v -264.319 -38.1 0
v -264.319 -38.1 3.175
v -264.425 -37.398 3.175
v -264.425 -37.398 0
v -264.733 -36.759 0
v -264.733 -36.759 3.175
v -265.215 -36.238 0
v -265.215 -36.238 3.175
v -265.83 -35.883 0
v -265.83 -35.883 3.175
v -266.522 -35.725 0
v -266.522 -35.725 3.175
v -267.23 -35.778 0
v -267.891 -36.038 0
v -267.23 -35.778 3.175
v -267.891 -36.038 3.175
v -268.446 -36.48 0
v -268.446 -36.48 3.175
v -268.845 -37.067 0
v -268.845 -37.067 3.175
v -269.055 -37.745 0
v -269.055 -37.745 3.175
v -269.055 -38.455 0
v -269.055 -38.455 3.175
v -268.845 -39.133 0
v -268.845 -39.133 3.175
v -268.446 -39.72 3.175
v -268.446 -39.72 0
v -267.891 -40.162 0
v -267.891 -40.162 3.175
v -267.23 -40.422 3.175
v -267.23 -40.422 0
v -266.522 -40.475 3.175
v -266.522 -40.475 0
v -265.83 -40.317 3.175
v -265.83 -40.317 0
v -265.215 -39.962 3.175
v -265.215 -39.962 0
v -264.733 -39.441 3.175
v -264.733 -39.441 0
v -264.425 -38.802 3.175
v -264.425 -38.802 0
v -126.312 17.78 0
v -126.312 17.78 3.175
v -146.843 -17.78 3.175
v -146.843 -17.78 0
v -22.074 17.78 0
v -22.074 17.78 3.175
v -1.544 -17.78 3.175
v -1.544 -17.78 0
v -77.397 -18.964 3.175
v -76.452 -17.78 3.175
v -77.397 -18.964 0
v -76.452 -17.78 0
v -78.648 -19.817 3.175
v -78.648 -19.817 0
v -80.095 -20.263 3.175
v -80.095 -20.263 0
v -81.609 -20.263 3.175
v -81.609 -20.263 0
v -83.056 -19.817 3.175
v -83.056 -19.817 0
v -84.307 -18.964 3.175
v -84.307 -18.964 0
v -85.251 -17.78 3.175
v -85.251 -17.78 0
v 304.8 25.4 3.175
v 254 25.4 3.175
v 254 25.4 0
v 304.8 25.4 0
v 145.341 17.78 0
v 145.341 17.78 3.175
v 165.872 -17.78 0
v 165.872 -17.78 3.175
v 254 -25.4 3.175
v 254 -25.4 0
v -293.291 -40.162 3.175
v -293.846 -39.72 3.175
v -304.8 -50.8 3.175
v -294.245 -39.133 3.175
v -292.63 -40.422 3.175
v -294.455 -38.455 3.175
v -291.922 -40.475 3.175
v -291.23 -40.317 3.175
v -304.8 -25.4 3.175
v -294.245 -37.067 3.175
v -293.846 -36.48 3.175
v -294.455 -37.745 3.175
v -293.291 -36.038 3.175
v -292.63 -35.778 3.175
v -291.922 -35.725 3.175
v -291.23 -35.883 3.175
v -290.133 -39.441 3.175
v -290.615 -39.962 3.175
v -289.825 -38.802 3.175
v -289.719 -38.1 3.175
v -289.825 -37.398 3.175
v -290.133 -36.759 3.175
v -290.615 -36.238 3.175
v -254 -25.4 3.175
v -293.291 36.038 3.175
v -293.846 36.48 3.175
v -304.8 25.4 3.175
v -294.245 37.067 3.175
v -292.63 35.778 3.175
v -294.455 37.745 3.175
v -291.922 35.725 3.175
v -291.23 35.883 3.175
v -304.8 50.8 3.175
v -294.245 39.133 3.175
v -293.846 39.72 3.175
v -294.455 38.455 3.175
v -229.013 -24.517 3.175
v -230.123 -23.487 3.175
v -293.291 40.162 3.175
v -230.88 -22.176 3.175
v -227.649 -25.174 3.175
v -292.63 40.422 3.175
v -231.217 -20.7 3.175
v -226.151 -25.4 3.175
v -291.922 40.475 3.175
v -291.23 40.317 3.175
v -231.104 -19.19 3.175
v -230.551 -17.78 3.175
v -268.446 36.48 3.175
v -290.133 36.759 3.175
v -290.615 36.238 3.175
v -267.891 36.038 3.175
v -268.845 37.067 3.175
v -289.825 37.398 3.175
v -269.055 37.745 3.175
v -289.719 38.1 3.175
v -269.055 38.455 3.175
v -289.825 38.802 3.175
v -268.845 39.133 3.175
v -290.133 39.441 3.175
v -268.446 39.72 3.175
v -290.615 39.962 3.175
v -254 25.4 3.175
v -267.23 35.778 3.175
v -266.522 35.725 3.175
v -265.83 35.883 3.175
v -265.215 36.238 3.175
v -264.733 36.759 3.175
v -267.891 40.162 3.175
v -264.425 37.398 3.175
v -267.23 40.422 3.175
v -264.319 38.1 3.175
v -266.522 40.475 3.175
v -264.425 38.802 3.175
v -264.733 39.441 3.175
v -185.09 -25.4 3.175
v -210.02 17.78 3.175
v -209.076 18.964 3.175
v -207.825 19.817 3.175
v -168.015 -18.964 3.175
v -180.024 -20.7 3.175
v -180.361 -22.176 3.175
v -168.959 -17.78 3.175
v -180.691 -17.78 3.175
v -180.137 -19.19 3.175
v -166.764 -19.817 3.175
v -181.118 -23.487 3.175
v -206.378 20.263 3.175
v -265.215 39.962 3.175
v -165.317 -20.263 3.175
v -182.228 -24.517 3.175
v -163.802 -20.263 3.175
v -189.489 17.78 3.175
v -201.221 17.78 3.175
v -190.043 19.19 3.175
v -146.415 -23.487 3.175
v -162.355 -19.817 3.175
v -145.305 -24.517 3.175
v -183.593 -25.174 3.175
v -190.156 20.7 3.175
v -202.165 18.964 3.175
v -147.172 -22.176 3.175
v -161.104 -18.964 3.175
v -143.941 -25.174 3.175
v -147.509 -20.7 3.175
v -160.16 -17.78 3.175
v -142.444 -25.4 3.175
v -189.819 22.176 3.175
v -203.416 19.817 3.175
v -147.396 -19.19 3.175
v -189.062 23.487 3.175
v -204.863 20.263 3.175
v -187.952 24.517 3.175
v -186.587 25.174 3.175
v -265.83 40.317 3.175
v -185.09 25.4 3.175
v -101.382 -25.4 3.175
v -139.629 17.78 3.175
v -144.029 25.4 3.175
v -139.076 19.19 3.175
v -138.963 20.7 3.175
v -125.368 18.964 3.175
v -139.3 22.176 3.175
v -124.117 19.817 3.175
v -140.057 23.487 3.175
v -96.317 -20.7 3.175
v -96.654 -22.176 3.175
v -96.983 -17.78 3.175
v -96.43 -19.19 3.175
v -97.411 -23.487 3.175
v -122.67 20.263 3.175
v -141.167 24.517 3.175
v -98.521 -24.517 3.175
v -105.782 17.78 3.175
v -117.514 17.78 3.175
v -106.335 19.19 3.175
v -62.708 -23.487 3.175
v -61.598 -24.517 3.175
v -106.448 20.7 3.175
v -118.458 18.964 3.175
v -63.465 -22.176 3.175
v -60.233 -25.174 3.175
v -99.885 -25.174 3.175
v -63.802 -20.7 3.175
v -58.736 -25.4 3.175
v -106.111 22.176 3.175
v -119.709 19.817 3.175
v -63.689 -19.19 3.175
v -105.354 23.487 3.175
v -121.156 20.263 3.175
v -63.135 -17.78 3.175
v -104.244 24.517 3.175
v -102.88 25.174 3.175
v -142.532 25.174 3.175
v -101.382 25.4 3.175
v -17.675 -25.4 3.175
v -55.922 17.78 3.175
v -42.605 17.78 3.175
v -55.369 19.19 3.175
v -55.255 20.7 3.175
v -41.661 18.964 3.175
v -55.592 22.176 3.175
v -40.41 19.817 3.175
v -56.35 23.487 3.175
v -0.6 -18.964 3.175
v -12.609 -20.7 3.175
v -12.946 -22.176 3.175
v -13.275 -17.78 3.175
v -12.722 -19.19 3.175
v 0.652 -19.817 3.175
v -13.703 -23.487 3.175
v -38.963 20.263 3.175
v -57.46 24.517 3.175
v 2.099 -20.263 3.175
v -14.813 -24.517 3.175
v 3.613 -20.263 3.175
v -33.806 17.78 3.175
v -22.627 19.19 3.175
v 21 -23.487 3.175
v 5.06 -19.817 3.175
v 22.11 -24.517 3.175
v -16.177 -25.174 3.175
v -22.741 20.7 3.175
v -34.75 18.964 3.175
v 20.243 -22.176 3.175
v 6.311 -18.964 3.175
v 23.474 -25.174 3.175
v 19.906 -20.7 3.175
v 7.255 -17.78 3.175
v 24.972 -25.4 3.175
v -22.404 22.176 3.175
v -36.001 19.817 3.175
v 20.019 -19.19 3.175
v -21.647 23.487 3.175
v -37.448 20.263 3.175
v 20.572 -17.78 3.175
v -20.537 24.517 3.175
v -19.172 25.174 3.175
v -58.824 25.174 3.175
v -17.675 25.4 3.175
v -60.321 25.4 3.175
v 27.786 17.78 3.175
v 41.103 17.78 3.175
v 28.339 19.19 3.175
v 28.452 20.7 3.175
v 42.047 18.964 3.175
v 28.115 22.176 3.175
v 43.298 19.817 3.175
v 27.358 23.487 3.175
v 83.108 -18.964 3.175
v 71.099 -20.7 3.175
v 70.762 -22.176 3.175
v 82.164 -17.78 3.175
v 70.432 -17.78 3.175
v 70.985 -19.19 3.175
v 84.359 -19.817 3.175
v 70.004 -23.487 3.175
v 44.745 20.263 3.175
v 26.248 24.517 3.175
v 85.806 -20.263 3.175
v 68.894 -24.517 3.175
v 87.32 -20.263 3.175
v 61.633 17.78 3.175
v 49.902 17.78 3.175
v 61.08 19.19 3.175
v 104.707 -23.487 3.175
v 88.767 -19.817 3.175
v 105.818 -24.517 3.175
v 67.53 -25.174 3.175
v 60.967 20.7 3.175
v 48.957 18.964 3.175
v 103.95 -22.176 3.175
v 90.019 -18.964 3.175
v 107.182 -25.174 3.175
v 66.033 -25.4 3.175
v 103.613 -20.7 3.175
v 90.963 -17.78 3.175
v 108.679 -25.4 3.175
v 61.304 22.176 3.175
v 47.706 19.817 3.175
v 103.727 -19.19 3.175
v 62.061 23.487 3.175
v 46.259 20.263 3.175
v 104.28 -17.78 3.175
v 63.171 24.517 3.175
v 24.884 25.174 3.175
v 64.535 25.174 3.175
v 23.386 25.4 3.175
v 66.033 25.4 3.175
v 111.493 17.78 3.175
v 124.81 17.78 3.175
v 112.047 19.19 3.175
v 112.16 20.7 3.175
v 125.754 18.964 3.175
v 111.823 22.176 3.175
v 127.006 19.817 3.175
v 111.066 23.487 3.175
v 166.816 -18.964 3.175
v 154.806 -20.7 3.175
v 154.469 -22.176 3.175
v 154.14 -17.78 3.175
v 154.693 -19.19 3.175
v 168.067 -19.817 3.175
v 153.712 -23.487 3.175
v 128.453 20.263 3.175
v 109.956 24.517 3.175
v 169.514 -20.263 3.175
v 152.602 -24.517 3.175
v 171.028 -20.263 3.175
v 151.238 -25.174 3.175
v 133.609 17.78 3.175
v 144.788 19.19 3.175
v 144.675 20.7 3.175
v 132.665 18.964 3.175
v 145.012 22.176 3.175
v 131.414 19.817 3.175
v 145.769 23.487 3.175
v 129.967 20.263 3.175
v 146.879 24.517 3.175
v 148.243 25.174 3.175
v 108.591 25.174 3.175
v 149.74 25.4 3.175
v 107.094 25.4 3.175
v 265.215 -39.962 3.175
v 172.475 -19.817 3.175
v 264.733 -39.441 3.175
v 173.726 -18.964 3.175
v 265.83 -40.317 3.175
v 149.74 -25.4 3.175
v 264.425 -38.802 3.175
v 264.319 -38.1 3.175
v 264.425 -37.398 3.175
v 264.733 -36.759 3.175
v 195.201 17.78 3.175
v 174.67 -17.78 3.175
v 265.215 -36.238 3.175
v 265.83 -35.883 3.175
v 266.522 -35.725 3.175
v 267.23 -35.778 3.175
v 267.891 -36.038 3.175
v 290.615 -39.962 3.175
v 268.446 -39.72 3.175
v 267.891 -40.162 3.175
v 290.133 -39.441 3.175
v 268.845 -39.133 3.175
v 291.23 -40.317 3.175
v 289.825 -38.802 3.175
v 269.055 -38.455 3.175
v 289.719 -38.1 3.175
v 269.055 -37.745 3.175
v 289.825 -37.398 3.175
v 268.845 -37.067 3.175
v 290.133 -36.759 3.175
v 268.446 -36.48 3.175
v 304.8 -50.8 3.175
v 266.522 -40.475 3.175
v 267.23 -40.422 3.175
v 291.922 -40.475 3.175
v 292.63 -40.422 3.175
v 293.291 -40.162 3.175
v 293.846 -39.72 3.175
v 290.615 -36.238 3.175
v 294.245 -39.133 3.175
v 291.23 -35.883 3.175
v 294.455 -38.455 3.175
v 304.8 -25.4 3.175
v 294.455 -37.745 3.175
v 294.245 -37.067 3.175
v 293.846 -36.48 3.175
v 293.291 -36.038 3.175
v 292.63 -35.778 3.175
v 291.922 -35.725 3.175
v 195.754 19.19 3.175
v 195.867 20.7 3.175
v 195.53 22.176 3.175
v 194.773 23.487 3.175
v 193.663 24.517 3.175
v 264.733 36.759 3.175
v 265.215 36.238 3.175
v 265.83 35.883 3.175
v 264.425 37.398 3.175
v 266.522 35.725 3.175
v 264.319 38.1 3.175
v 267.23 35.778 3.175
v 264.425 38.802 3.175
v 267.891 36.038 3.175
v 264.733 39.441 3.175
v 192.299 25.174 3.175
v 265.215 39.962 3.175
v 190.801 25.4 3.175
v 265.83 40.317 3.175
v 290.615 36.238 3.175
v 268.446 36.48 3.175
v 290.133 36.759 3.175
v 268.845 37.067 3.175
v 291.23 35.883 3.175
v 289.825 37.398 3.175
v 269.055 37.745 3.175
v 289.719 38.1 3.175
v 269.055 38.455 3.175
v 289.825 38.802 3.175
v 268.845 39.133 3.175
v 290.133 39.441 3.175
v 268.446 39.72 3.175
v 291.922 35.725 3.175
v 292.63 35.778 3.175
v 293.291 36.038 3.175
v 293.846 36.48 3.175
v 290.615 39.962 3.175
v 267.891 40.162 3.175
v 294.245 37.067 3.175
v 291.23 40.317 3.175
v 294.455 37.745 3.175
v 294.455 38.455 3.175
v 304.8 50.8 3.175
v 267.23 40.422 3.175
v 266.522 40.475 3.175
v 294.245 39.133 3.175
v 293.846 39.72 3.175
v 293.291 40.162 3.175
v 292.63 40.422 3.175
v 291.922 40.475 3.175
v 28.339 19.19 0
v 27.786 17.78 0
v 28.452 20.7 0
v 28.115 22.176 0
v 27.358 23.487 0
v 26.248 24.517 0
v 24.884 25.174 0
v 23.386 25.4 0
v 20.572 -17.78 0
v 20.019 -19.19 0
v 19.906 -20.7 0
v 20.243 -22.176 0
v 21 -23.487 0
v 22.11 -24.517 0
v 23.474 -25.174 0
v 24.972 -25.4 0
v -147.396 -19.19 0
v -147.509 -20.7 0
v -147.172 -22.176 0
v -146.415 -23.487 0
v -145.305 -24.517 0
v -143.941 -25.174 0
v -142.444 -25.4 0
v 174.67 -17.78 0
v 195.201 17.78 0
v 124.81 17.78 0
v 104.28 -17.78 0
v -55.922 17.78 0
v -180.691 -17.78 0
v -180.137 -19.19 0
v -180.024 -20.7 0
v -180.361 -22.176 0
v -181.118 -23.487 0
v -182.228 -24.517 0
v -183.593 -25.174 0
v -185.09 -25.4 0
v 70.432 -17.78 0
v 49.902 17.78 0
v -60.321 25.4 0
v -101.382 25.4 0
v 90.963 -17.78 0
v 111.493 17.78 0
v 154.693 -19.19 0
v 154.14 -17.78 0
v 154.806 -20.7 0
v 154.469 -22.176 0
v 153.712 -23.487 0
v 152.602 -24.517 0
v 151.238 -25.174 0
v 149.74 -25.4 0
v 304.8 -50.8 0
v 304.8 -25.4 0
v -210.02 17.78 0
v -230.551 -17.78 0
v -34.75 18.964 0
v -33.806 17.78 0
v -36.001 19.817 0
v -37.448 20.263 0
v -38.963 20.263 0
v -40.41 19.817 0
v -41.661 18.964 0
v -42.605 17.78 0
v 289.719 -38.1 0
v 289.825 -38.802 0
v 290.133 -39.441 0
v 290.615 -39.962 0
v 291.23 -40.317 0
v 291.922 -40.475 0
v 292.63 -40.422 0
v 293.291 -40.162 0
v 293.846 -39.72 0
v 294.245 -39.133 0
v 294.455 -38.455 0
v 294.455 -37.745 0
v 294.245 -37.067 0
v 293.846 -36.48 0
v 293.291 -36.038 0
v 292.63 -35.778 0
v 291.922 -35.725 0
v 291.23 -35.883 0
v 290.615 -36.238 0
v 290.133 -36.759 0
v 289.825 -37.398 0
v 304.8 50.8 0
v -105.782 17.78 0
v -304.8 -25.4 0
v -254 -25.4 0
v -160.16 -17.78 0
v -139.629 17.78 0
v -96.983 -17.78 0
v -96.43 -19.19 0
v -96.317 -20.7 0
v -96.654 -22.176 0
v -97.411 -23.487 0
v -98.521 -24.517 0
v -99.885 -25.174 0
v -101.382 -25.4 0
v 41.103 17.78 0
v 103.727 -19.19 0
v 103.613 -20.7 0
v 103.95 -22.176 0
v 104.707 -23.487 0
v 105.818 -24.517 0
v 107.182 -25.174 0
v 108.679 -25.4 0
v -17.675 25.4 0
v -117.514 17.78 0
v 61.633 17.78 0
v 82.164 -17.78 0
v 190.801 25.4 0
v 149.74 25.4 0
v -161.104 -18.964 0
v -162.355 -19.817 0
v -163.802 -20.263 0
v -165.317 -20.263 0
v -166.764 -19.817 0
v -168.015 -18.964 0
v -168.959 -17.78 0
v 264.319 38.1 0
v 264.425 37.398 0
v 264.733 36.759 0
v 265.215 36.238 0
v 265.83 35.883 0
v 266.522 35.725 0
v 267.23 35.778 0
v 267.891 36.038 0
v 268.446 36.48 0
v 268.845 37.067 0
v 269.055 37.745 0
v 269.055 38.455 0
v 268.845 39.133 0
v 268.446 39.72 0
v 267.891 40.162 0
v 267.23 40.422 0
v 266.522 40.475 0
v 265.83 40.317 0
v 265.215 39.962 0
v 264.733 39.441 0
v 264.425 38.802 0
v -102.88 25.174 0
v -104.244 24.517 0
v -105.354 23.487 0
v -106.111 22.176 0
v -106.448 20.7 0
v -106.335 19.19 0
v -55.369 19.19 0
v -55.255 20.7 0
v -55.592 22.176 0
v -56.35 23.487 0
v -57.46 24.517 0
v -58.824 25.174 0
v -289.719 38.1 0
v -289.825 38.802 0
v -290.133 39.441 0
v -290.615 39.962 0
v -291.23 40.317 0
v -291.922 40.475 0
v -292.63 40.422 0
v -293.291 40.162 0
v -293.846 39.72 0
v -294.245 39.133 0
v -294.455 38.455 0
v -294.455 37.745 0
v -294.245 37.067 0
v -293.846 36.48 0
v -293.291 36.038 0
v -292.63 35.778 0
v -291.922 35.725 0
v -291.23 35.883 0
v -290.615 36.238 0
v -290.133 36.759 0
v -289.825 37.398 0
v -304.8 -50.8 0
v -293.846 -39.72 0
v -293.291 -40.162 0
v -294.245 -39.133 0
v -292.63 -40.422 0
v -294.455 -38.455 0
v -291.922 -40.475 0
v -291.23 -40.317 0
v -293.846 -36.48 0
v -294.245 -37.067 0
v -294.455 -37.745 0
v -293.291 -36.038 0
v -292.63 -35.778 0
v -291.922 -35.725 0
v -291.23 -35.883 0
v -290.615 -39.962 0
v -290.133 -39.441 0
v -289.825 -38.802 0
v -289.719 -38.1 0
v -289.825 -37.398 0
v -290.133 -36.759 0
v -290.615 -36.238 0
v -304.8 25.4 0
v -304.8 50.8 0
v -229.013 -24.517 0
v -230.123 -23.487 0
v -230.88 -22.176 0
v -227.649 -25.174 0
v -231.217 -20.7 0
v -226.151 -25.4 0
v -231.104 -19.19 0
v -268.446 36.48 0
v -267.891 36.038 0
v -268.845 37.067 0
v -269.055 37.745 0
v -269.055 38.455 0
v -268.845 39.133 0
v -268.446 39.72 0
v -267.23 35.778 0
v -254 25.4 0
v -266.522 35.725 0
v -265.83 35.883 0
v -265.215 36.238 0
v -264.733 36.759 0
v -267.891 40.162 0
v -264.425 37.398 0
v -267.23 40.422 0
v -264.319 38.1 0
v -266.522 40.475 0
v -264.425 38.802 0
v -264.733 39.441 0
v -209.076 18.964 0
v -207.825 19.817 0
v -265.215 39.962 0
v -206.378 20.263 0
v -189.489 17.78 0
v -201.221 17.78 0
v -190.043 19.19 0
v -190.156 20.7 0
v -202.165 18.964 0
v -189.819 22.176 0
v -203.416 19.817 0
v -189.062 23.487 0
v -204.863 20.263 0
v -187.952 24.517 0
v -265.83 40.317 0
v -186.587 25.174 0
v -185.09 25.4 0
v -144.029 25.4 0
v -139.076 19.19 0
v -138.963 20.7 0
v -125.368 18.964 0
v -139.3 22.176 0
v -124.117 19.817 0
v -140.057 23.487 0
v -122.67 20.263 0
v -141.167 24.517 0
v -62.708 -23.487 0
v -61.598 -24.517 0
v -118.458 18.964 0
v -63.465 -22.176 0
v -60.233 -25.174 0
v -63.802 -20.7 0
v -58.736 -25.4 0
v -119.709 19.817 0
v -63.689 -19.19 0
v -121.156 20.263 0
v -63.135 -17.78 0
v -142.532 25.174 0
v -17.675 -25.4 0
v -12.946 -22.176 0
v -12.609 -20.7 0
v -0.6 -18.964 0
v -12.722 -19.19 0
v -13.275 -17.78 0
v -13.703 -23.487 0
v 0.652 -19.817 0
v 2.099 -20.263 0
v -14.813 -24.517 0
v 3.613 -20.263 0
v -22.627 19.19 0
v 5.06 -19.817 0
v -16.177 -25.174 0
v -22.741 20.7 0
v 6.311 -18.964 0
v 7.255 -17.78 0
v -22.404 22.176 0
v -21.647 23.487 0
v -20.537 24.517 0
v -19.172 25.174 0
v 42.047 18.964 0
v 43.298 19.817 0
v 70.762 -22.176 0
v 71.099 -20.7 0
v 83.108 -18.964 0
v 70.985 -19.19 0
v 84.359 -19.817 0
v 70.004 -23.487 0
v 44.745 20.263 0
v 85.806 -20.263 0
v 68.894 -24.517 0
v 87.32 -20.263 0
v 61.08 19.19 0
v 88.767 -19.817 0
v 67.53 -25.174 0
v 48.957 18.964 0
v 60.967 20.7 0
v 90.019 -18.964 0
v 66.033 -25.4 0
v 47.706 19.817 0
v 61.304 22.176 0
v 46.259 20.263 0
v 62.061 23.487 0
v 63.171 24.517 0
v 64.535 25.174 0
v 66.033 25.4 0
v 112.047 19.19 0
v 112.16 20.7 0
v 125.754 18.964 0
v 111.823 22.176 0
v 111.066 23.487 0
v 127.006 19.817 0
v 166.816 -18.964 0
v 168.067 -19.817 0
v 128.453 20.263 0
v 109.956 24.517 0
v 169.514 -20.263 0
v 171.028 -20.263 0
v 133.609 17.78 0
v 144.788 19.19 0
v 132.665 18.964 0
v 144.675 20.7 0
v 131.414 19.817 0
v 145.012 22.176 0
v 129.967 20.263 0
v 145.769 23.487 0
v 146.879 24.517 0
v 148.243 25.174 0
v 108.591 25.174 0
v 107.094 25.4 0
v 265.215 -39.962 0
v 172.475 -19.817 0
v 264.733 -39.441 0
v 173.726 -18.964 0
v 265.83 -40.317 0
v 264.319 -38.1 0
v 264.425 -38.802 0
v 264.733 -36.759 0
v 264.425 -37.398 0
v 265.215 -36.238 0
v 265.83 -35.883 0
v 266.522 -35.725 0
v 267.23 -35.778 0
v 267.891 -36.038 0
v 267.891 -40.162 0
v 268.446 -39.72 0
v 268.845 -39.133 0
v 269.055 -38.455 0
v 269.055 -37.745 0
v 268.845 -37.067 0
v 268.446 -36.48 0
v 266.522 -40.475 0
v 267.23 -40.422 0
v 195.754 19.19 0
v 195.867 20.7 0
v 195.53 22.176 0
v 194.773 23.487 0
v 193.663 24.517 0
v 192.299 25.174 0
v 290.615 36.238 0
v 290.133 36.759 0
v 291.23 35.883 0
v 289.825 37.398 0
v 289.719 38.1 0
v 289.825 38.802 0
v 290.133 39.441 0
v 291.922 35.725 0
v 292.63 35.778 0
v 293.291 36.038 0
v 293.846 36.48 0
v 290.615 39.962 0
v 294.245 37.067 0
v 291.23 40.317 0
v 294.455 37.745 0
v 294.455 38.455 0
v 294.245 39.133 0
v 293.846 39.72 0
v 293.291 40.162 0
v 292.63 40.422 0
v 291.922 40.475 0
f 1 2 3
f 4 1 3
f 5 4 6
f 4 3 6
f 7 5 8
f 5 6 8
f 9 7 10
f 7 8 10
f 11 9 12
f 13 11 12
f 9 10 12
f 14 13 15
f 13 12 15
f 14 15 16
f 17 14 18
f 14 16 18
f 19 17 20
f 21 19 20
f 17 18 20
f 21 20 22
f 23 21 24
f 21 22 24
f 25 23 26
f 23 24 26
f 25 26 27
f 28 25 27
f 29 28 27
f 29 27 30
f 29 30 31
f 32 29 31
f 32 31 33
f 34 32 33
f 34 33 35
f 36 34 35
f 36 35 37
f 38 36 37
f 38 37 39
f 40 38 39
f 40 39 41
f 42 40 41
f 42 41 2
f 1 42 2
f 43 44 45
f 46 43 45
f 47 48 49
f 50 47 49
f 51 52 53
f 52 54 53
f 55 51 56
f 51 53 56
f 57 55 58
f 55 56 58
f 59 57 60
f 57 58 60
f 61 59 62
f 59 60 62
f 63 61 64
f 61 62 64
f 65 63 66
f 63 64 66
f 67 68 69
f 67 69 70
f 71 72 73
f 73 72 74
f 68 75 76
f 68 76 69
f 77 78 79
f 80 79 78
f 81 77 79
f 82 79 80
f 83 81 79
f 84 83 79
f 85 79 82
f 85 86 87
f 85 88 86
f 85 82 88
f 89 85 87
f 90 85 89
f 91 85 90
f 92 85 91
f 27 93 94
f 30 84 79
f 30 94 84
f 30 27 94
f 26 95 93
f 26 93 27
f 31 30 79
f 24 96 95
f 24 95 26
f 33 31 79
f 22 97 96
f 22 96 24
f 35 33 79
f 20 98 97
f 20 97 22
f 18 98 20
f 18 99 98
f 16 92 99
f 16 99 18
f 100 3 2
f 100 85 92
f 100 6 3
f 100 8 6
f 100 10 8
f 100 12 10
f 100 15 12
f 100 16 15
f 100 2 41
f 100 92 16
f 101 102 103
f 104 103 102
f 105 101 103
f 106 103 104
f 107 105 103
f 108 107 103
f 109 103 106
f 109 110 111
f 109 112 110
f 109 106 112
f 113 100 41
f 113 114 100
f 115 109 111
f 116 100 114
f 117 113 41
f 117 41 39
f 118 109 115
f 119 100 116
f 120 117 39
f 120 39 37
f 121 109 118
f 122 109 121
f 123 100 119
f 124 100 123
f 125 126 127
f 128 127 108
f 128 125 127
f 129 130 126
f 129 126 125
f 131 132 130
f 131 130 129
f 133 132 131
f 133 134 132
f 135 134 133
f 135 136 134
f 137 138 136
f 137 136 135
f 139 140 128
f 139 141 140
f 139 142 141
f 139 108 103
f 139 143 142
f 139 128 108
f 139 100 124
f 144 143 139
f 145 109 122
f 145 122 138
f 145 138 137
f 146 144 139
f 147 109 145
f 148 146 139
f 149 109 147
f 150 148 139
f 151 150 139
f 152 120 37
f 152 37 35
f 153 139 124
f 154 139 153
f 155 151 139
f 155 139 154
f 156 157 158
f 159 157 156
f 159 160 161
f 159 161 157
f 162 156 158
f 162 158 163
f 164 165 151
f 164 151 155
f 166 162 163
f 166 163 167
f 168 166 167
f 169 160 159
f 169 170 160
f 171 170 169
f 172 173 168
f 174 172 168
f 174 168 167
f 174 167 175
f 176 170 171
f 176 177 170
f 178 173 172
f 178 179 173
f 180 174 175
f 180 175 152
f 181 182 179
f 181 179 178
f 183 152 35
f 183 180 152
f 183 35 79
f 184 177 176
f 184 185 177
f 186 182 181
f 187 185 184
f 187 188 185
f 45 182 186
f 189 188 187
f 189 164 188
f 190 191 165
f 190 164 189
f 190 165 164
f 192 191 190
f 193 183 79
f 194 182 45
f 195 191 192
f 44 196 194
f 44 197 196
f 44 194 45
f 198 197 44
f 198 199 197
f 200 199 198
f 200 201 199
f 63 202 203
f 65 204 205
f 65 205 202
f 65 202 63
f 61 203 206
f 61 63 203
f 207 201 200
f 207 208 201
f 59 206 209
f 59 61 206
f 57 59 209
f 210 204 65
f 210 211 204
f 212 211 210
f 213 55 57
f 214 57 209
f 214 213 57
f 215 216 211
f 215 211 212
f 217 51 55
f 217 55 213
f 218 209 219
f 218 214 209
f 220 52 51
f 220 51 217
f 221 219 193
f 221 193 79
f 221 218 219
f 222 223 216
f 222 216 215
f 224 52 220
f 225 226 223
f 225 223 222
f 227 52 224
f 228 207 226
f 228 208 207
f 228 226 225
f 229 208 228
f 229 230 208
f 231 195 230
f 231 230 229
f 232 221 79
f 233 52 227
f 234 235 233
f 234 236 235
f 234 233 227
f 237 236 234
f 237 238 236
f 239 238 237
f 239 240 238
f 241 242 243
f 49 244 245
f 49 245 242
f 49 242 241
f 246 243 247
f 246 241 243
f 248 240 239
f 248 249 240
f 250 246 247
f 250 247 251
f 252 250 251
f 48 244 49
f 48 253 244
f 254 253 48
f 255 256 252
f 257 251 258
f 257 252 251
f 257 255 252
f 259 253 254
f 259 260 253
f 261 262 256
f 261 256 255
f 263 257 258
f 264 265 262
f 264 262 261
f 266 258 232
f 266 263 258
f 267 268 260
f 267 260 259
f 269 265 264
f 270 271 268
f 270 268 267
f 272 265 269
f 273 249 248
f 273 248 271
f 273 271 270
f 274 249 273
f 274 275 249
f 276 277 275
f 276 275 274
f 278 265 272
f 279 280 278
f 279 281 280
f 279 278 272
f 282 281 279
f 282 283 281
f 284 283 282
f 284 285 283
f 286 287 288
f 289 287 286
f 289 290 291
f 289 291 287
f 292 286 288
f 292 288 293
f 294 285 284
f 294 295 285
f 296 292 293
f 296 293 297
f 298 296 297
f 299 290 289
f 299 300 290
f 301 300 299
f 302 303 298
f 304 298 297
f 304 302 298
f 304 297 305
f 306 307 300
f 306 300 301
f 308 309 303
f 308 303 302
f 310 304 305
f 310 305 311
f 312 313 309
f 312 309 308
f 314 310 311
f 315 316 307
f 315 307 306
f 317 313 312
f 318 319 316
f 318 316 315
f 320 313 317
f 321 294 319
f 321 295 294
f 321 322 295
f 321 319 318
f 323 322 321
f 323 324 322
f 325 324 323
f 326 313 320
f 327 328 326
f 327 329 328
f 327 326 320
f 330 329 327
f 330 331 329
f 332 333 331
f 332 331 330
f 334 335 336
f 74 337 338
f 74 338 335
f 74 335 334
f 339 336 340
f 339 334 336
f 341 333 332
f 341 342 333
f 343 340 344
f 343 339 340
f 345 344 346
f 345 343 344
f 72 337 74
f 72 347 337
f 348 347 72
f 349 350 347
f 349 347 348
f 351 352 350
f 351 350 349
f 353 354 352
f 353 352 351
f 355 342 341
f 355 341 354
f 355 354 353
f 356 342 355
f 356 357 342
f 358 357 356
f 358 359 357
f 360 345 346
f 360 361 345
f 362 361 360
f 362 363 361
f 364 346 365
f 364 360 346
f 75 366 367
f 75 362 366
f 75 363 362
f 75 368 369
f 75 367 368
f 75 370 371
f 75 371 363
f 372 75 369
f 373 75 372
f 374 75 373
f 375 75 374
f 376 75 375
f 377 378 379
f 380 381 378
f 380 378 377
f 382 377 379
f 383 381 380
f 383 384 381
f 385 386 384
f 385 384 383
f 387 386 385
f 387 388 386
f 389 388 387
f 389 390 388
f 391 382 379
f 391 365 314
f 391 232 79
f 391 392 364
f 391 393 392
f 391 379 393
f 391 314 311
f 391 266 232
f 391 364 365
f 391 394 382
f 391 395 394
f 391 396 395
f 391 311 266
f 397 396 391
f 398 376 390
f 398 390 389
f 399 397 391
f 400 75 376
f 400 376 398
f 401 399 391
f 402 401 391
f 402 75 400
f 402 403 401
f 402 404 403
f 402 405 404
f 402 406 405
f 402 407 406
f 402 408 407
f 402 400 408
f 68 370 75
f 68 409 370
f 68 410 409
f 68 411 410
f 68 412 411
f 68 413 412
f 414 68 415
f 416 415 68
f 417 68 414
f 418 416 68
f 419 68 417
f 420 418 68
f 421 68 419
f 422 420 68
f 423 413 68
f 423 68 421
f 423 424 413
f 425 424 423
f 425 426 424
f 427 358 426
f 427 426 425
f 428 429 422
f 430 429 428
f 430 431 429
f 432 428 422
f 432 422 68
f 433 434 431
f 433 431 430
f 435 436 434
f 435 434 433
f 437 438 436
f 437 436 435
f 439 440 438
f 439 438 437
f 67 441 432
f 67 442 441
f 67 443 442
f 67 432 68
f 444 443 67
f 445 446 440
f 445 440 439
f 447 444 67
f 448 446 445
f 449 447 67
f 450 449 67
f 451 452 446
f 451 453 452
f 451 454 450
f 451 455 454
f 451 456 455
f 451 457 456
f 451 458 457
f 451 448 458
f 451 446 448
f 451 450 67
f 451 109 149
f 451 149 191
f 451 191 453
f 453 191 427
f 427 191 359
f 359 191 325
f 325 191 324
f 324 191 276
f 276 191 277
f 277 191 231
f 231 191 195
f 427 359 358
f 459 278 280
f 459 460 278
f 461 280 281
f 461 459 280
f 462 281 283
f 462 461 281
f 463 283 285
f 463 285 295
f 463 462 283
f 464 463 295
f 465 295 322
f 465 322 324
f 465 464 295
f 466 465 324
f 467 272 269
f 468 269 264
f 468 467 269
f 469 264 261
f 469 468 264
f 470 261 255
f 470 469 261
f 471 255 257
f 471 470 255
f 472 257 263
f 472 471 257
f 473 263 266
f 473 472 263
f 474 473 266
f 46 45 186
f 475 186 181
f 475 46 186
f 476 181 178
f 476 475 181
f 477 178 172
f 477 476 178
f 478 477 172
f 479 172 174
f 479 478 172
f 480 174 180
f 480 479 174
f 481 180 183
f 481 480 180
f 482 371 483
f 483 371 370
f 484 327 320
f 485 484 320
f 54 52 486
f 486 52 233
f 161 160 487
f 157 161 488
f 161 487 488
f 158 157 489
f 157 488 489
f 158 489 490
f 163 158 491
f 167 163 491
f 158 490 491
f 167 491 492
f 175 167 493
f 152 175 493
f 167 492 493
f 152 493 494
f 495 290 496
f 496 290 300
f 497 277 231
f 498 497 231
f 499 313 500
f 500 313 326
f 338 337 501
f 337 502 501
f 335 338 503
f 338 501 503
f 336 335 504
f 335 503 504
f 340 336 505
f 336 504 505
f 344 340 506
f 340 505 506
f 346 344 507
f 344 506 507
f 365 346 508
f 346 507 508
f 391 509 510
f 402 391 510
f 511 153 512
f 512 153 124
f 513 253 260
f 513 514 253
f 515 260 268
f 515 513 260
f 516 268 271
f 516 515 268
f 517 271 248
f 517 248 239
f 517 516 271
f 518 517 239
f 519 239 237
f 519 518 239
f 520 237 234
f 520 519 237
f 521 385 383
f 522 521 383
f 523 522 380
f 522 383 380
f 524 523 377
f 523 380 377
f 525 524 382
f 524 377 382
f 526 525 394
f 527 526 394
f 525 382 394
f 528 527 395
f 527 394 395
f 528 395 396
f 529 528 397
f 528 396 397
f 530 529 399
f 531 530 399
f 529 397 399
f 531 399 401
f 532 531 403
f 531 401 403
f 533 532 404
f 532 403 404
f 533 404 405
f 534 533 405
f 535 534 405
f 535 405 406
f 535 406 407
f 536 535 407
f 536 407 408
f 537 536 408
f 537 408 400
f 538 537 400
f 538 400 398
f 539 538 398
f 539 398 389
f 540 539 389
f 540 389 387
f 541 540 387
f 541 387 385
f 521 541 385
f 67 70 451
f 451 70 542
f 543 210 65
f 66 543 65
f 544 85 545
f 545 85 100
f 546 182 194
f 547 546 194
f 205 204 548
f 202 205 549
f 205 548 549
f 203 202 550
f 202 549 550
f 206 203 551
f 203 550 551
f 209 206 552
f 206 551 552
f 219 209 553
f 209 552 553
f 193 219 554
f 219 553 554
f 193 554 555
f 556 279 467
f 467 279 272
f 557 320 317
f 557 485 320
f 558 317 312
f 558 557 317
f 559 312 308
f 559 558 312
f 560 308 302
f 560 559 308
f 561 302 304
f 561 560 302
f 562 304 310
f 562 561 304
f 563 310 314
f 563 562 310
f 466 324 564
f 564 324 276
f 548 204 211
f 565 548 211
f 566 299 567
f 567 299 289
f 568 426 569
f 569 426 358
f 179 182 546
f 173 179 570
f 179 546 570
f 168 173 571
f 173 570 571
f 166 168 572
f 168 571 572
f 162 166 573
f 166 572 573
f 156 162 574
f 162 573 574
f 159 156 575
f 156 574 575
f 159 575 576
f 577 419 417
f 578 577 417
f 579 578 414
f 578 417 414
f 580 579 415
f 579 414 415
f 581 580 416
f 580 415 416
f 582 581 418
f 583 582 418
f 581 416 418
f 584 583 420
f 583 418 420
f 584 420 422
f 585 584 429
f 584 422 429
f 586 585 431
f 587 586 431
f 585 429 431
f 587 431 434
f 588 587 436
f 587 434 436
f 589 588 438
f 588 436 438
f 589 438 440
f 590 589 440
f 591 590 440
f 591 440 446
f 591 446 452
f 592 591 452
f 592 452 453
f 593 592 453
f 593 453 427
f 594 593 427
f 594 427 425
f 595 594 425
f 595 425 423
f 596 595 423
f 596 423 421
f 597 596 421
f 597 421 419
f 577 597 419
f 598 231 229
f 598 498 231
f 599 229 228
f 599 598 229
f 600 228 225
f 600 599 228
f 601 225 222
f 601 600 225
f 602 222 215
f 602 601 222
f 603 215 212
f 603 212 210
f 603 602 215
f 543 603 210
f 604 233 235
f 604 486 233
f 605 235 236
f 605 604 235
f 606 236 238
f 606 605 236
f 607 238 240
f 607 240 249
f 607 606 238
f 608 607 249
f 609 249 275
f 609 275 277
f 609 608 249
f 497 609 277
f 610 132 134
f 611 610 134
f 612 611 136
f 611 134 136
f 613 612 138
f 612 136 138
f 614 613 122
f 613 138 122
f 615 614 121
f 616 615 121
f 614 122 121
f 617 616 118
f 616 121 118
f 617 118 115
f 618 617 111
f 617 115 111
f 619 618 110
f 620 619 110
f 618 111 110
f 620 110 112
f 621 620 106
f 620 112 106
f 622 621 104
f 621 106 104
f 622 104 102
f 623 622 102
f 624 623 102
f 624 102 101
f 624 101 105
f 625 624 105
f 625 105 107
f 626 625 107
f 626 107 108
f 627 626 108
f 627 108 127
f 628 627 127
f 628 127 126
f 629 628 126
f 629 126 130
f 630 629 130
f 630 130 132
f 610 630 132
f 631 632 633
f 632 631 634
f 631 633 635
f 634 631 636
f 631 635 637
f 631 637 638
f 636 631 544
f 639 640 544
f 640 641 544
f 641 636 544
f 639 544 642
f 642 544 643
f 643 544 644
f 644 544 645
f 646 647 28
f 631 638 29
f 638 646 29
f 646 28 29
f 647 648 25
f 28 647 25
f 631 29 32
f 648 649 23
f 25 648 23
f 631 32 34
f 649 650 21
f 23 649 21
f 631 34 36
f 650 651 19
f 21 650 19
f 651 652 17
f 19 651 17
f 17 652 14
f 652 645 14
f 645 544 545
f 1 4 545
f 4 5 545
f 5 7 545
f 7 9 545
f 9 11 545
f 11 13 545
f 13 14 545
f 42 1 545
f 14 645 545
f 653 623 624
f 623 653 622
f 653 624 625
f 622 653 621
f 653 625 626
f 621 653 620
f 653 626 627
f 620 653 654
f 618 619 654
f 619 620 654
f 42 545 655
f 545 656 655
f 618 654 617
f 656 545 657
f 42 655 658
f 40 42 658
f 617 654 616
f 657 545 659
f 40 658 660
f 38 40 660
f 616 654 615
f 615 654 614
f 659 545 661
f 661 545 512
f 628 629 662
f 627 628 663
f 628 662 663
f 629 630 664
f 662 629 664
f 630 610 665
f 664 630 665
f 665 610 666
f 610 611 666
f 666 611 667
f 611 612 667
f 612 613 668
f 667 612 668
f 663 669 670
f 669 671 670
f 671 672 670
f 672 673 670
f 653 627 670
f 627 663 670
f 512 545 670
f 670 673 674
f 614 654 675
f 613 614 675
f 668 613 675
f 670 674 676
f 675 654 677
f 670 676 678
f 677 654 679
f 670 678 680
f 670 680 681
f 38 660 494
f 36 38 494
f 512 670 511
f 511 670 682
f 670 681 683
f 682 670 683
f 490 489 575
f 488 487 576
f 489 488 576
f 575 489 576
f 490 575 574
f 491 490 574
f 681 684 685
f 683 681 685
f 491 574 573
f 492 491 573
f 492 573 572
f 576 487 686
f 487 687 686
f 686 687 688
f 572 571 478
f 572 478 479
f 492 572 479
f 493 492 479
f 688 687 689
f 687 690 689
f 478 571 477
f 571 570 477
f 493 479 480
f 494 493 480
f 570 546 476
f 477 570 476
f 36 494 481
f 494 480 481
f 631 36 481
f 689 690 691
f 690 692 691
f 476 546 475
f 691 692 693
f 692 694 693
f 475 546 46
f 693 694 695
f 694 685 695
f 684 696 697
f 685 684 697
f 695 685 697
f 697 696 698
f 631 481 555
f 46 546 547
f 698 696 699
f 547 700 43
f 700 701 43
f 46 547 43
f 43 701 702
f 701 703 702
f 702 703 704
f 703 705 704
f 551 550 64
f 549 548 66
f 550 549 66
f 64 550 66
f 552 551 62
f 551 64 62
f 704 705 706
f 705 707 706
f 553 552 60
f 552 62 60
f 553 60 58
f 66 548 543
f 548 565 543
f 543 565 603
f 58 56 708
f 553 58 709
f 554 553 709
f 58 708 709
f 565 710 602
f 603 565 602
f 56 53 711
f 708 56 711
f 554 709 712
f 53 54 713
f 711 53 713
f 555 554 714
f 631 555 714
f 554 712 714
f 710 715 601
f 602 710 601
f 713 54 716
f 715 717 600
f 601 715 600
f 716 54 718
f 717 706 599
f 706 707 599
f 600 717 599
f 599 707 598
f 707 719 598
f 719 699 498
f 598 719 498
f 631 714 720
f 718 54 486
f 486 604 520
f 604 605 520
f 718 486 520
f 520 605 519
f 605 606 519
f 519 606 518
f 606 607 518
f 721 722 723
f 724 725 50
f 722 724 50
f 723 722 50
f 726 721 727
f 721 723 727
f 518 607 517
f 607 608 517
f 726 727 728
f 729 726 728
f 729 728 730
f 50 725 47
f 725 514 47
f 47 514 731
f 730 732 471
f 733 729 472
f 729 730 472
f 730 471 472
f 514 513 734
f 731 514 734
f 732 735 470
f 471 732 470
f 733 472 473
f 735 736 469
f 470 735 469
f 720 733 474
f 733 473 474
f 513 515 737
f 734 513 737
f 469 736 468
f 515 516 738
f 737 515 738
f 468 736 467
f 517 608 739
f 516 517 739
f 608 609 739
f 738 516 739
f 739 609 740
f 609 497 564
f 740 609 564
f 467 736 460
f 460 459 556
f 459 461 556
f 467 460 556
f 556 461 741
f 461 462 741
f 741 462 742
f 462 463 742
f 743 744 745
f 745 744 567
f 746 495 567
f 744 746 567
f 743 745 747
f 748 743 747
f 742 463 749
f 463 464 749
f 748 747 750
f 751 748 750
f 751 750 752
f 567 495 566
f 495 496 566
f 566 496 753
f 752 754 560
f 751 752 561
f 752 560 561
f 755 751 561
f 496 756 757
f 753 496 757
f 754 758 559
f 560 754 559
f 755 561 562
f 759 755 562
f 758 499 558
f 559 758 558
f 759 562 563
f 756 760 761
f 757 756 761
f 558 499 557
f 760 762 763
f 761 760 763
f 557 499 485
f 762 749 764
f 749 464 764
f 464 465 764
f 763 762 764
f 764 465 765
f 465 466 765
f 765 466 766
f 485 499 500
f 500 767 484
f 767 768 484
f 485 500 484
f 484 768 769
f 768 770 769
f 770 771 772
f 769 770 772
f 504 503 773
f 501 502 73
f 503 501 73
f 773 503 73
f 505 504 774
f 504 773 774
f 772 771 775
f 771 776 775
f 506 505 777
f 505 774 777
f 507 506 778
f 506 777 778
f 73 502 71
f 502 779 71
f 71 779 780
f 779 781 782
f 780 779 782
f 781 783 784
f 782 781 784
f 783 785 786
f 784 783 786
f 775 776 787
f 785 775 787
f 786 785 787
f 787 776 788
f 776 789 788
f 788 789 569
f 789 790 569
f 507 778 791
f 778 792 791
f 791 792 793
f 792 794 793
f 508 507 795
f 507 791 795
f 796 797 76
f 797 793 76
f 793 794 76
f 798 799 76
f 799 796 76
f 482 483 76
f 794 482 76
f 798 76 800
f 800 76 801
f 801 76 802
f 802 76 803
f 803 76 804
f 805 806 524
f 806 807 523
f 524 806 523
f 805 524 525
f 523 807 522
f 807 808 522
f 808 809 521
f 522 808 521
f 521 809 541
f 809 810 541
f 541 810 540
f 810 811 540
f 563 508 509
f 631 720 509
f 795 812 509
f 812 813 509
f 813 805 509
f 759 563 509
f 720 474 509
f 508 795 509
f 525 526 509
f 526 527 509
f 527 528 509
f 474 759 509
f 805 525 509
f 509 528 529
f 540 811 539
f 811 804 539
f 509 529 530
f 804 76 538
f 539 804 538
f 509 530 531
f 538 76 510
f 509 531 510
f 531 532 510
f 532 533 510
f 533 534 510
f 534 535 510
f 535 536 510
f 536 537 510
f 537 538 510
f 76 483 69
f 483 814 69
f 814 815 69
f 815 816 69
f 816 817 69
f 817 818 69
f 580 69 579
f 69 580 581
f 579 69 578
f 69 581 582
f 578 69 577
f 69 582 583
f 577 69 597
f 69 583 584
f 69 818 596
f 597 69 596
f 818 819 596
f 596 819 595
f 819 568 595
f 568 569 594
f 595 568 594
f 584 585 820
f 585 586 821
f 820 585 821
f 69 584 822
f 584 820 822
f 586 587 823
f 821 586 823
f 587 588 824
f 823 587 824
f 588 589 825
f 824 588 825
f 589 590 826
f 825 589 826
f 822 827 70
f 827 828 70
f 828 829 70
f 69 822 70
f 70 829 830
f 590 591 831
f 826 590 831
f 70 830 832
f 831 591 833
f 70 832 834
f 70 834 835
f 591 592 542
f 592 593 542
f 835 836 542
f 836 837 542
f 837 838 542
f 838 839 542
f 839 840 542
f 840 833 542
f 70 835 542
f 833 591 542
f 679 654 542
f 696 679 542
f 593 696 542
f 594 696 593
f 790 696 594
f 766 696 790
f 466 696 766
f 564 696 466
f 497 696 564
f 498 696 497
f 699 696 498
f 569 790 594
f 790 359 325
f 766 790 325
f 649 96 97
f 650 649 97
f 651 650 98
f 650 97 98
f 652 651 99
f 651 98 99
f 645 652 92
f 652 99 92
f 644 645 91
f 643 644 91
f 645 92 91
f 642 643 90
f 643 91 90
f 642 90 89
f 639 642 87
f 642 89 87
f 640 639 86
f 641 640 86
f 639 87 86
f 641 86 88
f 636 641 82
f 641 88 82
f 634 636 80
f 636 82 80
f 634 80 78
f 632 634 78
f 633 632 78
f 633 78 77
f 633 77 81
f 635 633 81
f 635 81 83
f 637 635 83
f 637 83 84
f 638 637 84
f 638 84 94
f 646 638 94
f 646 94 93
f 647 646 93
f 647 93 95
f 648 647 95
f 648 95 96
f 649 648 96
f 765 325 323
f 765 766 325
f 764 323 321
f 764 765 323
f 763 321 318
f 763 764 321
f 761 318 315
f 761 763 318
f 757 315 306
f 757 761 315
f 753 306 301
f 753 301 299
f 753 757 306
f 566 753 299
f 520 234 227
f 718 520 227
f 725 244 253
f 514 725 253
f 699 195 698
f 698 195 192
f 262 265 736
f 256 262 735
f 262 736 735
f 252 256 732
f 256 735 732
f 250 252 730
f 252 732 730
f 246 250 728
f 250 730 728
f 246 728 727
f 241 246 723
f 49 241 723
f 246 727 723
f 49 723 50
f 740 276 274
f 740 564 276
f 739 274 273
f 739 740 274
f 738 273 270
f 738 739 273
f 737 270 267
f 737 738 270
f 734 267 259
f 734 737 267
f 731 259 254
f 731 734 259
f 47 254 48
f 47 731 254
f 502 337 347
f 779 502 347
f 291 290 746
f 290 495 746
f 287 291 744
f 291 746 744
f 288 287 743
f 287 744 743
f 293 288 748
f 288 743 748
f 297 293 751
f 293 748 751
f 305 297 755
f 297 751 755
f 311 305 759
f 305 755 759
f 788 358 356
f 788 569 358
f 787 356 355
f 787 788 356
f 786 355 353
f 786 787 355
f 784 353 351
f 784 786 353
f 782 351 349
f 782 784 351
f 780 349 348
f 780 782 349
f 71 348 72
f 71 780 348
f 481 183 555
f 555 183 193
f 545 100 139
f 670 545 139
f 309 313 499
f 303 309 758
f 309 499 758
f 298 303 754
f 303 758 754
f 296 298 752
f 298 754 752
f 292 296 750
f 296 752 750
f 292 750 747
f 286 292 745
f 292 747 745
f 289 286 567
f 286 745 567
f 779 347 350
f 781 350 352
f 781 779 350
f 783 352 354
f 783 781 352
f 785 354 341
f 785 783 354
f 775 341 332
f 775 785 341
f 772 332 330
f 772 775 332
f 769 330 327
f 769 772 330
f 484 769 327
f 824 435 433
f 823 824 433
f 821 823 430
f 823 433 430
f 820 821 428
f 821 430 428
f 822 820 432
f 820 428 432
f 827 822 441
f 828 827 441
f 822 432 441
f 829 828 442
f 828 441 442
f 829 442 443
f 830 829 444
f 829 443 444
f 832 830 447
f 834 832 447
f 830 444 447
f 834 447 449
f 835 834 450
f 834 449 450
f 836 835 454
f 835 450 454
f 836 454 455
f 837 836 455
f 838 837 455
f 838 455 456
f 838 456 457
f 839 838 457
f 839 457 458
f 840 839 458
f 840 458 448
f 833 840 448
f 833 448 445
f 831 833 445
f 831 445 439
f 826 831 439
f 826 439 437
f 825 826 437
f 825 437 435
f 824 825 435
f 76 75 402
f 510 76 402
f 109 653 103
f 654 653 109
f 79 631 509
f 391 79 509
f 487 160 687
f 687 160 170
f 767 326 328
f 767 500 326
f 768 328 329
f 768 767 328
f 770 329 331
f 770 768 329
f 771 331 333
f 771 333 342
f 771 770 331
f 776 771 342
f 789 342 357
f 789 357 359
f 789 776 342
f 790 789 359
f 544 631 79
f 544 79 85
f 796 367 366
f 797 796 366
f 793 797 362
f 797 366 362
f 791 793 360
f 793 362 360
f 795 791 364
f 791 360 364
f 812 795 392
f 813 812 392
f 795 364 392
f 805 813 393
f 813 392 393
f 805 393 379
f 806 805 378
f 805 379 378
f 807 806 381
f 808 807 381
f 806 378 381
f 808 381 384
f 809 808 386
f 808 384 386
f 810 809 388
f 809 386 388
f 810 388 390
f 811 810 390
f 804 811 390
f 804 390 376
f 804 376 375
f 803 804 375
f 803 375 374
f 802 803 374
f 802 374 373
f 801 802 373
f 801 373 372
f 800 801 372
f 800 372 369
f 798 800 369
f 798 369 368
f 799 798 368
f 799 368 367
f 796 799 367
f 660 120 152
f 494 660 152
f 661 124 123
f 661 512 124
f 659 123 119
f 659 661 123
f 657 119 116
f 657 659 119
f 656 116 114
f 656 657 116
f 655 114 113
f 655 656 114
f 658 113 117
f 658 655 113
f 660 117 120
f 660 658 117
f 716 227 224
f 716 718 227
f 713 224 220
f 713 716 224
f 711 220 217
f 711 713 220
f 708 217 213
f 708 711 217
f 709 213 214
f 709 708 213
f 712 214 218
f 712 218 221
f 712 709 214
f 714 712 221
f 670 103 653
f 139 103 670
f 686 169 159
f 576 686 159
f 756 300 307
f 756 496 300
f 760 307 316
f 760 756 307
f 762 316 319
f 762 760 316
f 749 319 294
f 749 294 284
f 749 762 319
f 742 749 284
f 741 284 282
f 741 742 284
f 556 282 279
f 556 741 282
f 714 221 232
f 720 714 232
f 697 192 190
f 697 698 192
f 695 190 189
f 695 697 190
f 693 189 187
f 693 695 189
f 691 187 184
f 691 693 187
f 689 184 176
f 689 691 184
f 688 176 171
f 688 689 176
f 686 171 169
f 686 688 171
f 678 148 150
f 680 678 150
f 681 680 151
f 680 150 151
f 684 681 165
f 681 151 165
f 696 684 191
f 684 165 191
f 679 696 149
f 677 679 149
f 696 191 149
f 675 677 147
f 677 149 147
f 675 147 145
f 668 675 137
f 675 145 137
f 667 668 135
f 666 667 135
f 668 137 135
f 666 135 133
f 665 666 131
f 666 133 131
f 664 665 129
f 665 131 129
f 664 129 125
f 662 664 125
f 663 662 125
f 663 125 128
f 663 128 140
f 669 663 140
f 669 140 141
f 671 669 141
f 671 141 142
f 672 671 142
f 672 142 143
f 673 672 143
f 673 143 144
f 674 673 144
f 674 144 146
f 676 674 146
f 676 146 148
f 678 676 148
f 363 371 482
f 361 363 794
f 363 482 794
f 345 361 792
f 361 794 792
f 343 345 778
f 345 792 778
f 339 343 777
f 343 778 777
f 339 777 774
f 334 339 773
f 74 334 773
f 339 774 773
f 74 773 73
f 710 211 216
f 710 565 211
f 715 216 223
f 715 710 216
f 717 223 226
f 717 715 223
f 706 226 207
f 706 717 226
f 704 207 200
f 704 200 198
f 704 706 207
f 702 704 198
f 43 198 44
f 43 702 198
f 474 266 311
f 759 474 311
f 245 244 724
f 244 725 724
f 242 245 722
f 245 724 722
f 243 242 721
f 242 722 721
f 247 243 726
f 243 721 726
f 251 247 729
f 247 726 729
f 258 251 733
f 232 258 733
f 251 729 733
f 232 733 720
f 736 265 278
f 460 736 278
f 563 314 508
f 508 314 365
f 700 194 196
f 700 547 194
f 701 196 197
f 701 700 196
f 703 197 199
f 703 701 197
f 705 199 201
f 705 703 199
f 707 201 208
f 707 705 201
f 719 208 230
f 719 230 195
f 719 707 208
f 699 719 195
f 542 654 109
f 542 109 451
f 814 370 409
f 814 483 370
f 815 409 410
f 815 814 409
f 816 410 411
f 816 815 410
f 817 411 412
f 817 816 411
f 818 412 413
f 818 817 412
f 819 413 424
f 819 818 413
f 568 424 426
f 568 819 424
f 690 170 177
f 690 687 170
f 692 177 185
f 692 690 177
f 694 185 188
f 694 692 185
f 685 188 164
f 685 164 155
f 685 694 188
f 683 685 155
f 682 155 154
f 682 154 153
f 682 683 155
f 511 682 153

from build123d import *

# Parameters (mm, degrees)
SKETCH1_W           = 609.6
SKETCH1_H           = 101.6
BOSS_EXTRUDE1_DEPTH = 3.175
SKETCH2_R           = 2.38125
CUT_EXTRUDE1_DEPTH  = 310.020647571
CUT_EXTRUDE2_DEPTH  = 310.020647571
FILLET1_R           = 5.08
SKETCH4_W           = 50.8
SKETCH4_H           = 50.8
CUT_EXTRUDE3_DEPTH  = 310.020647571


with BuildPart() as part:
    # Sketch1 → Boss-Extrude1 (new body)
    with BuildSketch(Plane.XY):
        Rectangle(SKETCH1_W, SKETCH1_H)
    extrude(amount=BOSS_EXTRUDE1_DEPTH)

    # Sketch2 → Cut-Extrude1 (cut, through all)
    with BuildSketch(Plane.XY.offset(3.175)):
        with Locations((-292.1, 38.1)):
            Circle(SKETCH2_R)
        with Locations((-292.1, -38.1)):
            Circle(SKETCH2_R)
        with Locations((-266.7, 38.1)):
            Circle(SKETCH2_R)
        with Locations((-266.7, -38.1)):
            Circle(SKETCH2_R)
        with Locations((-292.1, -19.05)):
            Circle(SKETCH2_R)
        with Locations((-266.7, -19.05)):
            Circle(SKETCH2_R)
        with Locations(Location((266.7, -19.05, 0), (0, 0, 180))):
            Circle(SKETCH2_R)
        with Locations(Location((292.1, -19.05, 0), (0, 0, 180))):
            Circle(SKETCH2_R)
        with Locations(Location((266.7, -38.1, 0), (0, 0, 180))):
            Circle(SKETCH2_R)
        with Locations(Location((266.7, 38.1, 0), (0, 0, 180))):
            Circle(SKETCH2_R)
        with Locations(Location((292.1, -38.1, 0), (0, 0, 180))):
            Circle(SKETCH2_R)
        with Locations(Location((292.1, 38.1, 0), (0, 0, 180))):
            Circle(SKETCH2_R)
    extrude(amount=-CUT_EXTRUDE1_DEPTH, mode=Mode.SUBTRACT)

    # Sketch3 → Cut-Extrude2 (cut, through all)
    with BuildSketch(Plane.XY.offset(3.175)):
        Polygon((-176.29121265, -25.4), (-205.620606325, 25.4), (-234.95, -25.4), align=None)
        Polygon((-164.55945518, -25.4), (-135.230061506, 25.4), (-193.888848855, 25.4), align=None)
        Polygon((-92.583618834, -25.4), (-121.913012509, 25.4), (-151.242406183, -25.4), align=None)
        Polygon((-80.851861364, -25.4), (-51.522467689, 25.4), (-110.181255039, 25.4), align=None)
        Polygon((-8.876025017, -25.4), (-38.205418692, 25.4), (-67.534812367, -25.4), align=None)
        Polygon((2.855732453, -25.4), (32.185126128, 25.4), (-26.473661222, 25.4), align=None)
        Polygon((74.8315688, -25.4), (45.502175125, 25.4), (16.17278145, -25.4), align=None)
        Polygon((86.563326269, -25.4), (115.892719944, 25.4), (57.233932595, 25.4), align=None)
        Polygon((158.539162616, -25.4), (129.209768941, 25.4), (99.880375267, -25.4), align=None)
        Polygon((170.270920086, -25.4), (199.600313761, 25.4), (140.941526411, 25.4), align=None)
    extrude(amount=-CUT_EXTRUDE2_DEPTH, mode=Mode.SUBTRACT)

    # Fillet1
    fillet1_edges = [part.edges().sort_by_distance(p)[0] for p in [
        (74.8315688, -25.4, 1.5875),
        (16.17278145, -25.4, 1.5875),
        (45.502175125, 25.4, 1.5875),
        (2.855732453, -25.4, 1.5875),
        (-26.473661222, 25.4, 1.5875),
        (32.185126128, 25.4, 1.5875),
        (158.539162616, -25.4, 1.5875),
        (99.880375267, -25.4, 1.5875),
        (129.209768941, 25.4, 1.5875),
        (86.563326269, -25.4, 1.5875),
        (57.233932595, 25.4, 1.5875),
        (115.892719944, 25.4, 1.5875),
        (-92.583618834, -25.4, 1.5875),
        (-151.242406183, -25.4, 1.5875),
        (-121.913012509, 25.4, 1.5875),
        (-164.55945518, -25.4, 1.5875),
        (-193.888848855, 25.4, 1.5875),
        (-135.230061506, 25.4, 1.5875),
        (-8.876025017, -25.4, 1.5875),
        (-67.534812367, -25.4, 1.5875),
        (-38.205418692, 25.4, 1.5875),
        (-80.851861364, -25.4, 1.5875),
        (-110.181255039, 25.4, 1.5875),
        (-51.522467689, 25.4, 1.5875),
        (170.270920086, -25.4, 1.5875),
        (140.941526411, 25.4, 1.5875),
        (199.600313761, 25.4, 1.5875),
        (-176.29121265, -25.4, 1.5875),
        (-234.95, -25.4, 1.5875),
        (-205.620606325, 25.4, 1.5875),
    ]]
    fillet(fillet1_edges, radius=FILLET1_R)

    # Sketch4 → Cut-Extrude3 (cut, through all)
    with BuildSketch(Plane.XY.offset(3.175)):
        with Locations((-279.4, 0)):
            Rectangle(SKETCH4_W, SKETCH4_H)
        with Locations((279.4, 0)):
            Rectangle(SKETCH4_W, SKETCH4_H)
    extrude(amount=-CUT_EXTRUDE3_DEPTH, mode=Mode.SUBTRACT)


solid = part.part
